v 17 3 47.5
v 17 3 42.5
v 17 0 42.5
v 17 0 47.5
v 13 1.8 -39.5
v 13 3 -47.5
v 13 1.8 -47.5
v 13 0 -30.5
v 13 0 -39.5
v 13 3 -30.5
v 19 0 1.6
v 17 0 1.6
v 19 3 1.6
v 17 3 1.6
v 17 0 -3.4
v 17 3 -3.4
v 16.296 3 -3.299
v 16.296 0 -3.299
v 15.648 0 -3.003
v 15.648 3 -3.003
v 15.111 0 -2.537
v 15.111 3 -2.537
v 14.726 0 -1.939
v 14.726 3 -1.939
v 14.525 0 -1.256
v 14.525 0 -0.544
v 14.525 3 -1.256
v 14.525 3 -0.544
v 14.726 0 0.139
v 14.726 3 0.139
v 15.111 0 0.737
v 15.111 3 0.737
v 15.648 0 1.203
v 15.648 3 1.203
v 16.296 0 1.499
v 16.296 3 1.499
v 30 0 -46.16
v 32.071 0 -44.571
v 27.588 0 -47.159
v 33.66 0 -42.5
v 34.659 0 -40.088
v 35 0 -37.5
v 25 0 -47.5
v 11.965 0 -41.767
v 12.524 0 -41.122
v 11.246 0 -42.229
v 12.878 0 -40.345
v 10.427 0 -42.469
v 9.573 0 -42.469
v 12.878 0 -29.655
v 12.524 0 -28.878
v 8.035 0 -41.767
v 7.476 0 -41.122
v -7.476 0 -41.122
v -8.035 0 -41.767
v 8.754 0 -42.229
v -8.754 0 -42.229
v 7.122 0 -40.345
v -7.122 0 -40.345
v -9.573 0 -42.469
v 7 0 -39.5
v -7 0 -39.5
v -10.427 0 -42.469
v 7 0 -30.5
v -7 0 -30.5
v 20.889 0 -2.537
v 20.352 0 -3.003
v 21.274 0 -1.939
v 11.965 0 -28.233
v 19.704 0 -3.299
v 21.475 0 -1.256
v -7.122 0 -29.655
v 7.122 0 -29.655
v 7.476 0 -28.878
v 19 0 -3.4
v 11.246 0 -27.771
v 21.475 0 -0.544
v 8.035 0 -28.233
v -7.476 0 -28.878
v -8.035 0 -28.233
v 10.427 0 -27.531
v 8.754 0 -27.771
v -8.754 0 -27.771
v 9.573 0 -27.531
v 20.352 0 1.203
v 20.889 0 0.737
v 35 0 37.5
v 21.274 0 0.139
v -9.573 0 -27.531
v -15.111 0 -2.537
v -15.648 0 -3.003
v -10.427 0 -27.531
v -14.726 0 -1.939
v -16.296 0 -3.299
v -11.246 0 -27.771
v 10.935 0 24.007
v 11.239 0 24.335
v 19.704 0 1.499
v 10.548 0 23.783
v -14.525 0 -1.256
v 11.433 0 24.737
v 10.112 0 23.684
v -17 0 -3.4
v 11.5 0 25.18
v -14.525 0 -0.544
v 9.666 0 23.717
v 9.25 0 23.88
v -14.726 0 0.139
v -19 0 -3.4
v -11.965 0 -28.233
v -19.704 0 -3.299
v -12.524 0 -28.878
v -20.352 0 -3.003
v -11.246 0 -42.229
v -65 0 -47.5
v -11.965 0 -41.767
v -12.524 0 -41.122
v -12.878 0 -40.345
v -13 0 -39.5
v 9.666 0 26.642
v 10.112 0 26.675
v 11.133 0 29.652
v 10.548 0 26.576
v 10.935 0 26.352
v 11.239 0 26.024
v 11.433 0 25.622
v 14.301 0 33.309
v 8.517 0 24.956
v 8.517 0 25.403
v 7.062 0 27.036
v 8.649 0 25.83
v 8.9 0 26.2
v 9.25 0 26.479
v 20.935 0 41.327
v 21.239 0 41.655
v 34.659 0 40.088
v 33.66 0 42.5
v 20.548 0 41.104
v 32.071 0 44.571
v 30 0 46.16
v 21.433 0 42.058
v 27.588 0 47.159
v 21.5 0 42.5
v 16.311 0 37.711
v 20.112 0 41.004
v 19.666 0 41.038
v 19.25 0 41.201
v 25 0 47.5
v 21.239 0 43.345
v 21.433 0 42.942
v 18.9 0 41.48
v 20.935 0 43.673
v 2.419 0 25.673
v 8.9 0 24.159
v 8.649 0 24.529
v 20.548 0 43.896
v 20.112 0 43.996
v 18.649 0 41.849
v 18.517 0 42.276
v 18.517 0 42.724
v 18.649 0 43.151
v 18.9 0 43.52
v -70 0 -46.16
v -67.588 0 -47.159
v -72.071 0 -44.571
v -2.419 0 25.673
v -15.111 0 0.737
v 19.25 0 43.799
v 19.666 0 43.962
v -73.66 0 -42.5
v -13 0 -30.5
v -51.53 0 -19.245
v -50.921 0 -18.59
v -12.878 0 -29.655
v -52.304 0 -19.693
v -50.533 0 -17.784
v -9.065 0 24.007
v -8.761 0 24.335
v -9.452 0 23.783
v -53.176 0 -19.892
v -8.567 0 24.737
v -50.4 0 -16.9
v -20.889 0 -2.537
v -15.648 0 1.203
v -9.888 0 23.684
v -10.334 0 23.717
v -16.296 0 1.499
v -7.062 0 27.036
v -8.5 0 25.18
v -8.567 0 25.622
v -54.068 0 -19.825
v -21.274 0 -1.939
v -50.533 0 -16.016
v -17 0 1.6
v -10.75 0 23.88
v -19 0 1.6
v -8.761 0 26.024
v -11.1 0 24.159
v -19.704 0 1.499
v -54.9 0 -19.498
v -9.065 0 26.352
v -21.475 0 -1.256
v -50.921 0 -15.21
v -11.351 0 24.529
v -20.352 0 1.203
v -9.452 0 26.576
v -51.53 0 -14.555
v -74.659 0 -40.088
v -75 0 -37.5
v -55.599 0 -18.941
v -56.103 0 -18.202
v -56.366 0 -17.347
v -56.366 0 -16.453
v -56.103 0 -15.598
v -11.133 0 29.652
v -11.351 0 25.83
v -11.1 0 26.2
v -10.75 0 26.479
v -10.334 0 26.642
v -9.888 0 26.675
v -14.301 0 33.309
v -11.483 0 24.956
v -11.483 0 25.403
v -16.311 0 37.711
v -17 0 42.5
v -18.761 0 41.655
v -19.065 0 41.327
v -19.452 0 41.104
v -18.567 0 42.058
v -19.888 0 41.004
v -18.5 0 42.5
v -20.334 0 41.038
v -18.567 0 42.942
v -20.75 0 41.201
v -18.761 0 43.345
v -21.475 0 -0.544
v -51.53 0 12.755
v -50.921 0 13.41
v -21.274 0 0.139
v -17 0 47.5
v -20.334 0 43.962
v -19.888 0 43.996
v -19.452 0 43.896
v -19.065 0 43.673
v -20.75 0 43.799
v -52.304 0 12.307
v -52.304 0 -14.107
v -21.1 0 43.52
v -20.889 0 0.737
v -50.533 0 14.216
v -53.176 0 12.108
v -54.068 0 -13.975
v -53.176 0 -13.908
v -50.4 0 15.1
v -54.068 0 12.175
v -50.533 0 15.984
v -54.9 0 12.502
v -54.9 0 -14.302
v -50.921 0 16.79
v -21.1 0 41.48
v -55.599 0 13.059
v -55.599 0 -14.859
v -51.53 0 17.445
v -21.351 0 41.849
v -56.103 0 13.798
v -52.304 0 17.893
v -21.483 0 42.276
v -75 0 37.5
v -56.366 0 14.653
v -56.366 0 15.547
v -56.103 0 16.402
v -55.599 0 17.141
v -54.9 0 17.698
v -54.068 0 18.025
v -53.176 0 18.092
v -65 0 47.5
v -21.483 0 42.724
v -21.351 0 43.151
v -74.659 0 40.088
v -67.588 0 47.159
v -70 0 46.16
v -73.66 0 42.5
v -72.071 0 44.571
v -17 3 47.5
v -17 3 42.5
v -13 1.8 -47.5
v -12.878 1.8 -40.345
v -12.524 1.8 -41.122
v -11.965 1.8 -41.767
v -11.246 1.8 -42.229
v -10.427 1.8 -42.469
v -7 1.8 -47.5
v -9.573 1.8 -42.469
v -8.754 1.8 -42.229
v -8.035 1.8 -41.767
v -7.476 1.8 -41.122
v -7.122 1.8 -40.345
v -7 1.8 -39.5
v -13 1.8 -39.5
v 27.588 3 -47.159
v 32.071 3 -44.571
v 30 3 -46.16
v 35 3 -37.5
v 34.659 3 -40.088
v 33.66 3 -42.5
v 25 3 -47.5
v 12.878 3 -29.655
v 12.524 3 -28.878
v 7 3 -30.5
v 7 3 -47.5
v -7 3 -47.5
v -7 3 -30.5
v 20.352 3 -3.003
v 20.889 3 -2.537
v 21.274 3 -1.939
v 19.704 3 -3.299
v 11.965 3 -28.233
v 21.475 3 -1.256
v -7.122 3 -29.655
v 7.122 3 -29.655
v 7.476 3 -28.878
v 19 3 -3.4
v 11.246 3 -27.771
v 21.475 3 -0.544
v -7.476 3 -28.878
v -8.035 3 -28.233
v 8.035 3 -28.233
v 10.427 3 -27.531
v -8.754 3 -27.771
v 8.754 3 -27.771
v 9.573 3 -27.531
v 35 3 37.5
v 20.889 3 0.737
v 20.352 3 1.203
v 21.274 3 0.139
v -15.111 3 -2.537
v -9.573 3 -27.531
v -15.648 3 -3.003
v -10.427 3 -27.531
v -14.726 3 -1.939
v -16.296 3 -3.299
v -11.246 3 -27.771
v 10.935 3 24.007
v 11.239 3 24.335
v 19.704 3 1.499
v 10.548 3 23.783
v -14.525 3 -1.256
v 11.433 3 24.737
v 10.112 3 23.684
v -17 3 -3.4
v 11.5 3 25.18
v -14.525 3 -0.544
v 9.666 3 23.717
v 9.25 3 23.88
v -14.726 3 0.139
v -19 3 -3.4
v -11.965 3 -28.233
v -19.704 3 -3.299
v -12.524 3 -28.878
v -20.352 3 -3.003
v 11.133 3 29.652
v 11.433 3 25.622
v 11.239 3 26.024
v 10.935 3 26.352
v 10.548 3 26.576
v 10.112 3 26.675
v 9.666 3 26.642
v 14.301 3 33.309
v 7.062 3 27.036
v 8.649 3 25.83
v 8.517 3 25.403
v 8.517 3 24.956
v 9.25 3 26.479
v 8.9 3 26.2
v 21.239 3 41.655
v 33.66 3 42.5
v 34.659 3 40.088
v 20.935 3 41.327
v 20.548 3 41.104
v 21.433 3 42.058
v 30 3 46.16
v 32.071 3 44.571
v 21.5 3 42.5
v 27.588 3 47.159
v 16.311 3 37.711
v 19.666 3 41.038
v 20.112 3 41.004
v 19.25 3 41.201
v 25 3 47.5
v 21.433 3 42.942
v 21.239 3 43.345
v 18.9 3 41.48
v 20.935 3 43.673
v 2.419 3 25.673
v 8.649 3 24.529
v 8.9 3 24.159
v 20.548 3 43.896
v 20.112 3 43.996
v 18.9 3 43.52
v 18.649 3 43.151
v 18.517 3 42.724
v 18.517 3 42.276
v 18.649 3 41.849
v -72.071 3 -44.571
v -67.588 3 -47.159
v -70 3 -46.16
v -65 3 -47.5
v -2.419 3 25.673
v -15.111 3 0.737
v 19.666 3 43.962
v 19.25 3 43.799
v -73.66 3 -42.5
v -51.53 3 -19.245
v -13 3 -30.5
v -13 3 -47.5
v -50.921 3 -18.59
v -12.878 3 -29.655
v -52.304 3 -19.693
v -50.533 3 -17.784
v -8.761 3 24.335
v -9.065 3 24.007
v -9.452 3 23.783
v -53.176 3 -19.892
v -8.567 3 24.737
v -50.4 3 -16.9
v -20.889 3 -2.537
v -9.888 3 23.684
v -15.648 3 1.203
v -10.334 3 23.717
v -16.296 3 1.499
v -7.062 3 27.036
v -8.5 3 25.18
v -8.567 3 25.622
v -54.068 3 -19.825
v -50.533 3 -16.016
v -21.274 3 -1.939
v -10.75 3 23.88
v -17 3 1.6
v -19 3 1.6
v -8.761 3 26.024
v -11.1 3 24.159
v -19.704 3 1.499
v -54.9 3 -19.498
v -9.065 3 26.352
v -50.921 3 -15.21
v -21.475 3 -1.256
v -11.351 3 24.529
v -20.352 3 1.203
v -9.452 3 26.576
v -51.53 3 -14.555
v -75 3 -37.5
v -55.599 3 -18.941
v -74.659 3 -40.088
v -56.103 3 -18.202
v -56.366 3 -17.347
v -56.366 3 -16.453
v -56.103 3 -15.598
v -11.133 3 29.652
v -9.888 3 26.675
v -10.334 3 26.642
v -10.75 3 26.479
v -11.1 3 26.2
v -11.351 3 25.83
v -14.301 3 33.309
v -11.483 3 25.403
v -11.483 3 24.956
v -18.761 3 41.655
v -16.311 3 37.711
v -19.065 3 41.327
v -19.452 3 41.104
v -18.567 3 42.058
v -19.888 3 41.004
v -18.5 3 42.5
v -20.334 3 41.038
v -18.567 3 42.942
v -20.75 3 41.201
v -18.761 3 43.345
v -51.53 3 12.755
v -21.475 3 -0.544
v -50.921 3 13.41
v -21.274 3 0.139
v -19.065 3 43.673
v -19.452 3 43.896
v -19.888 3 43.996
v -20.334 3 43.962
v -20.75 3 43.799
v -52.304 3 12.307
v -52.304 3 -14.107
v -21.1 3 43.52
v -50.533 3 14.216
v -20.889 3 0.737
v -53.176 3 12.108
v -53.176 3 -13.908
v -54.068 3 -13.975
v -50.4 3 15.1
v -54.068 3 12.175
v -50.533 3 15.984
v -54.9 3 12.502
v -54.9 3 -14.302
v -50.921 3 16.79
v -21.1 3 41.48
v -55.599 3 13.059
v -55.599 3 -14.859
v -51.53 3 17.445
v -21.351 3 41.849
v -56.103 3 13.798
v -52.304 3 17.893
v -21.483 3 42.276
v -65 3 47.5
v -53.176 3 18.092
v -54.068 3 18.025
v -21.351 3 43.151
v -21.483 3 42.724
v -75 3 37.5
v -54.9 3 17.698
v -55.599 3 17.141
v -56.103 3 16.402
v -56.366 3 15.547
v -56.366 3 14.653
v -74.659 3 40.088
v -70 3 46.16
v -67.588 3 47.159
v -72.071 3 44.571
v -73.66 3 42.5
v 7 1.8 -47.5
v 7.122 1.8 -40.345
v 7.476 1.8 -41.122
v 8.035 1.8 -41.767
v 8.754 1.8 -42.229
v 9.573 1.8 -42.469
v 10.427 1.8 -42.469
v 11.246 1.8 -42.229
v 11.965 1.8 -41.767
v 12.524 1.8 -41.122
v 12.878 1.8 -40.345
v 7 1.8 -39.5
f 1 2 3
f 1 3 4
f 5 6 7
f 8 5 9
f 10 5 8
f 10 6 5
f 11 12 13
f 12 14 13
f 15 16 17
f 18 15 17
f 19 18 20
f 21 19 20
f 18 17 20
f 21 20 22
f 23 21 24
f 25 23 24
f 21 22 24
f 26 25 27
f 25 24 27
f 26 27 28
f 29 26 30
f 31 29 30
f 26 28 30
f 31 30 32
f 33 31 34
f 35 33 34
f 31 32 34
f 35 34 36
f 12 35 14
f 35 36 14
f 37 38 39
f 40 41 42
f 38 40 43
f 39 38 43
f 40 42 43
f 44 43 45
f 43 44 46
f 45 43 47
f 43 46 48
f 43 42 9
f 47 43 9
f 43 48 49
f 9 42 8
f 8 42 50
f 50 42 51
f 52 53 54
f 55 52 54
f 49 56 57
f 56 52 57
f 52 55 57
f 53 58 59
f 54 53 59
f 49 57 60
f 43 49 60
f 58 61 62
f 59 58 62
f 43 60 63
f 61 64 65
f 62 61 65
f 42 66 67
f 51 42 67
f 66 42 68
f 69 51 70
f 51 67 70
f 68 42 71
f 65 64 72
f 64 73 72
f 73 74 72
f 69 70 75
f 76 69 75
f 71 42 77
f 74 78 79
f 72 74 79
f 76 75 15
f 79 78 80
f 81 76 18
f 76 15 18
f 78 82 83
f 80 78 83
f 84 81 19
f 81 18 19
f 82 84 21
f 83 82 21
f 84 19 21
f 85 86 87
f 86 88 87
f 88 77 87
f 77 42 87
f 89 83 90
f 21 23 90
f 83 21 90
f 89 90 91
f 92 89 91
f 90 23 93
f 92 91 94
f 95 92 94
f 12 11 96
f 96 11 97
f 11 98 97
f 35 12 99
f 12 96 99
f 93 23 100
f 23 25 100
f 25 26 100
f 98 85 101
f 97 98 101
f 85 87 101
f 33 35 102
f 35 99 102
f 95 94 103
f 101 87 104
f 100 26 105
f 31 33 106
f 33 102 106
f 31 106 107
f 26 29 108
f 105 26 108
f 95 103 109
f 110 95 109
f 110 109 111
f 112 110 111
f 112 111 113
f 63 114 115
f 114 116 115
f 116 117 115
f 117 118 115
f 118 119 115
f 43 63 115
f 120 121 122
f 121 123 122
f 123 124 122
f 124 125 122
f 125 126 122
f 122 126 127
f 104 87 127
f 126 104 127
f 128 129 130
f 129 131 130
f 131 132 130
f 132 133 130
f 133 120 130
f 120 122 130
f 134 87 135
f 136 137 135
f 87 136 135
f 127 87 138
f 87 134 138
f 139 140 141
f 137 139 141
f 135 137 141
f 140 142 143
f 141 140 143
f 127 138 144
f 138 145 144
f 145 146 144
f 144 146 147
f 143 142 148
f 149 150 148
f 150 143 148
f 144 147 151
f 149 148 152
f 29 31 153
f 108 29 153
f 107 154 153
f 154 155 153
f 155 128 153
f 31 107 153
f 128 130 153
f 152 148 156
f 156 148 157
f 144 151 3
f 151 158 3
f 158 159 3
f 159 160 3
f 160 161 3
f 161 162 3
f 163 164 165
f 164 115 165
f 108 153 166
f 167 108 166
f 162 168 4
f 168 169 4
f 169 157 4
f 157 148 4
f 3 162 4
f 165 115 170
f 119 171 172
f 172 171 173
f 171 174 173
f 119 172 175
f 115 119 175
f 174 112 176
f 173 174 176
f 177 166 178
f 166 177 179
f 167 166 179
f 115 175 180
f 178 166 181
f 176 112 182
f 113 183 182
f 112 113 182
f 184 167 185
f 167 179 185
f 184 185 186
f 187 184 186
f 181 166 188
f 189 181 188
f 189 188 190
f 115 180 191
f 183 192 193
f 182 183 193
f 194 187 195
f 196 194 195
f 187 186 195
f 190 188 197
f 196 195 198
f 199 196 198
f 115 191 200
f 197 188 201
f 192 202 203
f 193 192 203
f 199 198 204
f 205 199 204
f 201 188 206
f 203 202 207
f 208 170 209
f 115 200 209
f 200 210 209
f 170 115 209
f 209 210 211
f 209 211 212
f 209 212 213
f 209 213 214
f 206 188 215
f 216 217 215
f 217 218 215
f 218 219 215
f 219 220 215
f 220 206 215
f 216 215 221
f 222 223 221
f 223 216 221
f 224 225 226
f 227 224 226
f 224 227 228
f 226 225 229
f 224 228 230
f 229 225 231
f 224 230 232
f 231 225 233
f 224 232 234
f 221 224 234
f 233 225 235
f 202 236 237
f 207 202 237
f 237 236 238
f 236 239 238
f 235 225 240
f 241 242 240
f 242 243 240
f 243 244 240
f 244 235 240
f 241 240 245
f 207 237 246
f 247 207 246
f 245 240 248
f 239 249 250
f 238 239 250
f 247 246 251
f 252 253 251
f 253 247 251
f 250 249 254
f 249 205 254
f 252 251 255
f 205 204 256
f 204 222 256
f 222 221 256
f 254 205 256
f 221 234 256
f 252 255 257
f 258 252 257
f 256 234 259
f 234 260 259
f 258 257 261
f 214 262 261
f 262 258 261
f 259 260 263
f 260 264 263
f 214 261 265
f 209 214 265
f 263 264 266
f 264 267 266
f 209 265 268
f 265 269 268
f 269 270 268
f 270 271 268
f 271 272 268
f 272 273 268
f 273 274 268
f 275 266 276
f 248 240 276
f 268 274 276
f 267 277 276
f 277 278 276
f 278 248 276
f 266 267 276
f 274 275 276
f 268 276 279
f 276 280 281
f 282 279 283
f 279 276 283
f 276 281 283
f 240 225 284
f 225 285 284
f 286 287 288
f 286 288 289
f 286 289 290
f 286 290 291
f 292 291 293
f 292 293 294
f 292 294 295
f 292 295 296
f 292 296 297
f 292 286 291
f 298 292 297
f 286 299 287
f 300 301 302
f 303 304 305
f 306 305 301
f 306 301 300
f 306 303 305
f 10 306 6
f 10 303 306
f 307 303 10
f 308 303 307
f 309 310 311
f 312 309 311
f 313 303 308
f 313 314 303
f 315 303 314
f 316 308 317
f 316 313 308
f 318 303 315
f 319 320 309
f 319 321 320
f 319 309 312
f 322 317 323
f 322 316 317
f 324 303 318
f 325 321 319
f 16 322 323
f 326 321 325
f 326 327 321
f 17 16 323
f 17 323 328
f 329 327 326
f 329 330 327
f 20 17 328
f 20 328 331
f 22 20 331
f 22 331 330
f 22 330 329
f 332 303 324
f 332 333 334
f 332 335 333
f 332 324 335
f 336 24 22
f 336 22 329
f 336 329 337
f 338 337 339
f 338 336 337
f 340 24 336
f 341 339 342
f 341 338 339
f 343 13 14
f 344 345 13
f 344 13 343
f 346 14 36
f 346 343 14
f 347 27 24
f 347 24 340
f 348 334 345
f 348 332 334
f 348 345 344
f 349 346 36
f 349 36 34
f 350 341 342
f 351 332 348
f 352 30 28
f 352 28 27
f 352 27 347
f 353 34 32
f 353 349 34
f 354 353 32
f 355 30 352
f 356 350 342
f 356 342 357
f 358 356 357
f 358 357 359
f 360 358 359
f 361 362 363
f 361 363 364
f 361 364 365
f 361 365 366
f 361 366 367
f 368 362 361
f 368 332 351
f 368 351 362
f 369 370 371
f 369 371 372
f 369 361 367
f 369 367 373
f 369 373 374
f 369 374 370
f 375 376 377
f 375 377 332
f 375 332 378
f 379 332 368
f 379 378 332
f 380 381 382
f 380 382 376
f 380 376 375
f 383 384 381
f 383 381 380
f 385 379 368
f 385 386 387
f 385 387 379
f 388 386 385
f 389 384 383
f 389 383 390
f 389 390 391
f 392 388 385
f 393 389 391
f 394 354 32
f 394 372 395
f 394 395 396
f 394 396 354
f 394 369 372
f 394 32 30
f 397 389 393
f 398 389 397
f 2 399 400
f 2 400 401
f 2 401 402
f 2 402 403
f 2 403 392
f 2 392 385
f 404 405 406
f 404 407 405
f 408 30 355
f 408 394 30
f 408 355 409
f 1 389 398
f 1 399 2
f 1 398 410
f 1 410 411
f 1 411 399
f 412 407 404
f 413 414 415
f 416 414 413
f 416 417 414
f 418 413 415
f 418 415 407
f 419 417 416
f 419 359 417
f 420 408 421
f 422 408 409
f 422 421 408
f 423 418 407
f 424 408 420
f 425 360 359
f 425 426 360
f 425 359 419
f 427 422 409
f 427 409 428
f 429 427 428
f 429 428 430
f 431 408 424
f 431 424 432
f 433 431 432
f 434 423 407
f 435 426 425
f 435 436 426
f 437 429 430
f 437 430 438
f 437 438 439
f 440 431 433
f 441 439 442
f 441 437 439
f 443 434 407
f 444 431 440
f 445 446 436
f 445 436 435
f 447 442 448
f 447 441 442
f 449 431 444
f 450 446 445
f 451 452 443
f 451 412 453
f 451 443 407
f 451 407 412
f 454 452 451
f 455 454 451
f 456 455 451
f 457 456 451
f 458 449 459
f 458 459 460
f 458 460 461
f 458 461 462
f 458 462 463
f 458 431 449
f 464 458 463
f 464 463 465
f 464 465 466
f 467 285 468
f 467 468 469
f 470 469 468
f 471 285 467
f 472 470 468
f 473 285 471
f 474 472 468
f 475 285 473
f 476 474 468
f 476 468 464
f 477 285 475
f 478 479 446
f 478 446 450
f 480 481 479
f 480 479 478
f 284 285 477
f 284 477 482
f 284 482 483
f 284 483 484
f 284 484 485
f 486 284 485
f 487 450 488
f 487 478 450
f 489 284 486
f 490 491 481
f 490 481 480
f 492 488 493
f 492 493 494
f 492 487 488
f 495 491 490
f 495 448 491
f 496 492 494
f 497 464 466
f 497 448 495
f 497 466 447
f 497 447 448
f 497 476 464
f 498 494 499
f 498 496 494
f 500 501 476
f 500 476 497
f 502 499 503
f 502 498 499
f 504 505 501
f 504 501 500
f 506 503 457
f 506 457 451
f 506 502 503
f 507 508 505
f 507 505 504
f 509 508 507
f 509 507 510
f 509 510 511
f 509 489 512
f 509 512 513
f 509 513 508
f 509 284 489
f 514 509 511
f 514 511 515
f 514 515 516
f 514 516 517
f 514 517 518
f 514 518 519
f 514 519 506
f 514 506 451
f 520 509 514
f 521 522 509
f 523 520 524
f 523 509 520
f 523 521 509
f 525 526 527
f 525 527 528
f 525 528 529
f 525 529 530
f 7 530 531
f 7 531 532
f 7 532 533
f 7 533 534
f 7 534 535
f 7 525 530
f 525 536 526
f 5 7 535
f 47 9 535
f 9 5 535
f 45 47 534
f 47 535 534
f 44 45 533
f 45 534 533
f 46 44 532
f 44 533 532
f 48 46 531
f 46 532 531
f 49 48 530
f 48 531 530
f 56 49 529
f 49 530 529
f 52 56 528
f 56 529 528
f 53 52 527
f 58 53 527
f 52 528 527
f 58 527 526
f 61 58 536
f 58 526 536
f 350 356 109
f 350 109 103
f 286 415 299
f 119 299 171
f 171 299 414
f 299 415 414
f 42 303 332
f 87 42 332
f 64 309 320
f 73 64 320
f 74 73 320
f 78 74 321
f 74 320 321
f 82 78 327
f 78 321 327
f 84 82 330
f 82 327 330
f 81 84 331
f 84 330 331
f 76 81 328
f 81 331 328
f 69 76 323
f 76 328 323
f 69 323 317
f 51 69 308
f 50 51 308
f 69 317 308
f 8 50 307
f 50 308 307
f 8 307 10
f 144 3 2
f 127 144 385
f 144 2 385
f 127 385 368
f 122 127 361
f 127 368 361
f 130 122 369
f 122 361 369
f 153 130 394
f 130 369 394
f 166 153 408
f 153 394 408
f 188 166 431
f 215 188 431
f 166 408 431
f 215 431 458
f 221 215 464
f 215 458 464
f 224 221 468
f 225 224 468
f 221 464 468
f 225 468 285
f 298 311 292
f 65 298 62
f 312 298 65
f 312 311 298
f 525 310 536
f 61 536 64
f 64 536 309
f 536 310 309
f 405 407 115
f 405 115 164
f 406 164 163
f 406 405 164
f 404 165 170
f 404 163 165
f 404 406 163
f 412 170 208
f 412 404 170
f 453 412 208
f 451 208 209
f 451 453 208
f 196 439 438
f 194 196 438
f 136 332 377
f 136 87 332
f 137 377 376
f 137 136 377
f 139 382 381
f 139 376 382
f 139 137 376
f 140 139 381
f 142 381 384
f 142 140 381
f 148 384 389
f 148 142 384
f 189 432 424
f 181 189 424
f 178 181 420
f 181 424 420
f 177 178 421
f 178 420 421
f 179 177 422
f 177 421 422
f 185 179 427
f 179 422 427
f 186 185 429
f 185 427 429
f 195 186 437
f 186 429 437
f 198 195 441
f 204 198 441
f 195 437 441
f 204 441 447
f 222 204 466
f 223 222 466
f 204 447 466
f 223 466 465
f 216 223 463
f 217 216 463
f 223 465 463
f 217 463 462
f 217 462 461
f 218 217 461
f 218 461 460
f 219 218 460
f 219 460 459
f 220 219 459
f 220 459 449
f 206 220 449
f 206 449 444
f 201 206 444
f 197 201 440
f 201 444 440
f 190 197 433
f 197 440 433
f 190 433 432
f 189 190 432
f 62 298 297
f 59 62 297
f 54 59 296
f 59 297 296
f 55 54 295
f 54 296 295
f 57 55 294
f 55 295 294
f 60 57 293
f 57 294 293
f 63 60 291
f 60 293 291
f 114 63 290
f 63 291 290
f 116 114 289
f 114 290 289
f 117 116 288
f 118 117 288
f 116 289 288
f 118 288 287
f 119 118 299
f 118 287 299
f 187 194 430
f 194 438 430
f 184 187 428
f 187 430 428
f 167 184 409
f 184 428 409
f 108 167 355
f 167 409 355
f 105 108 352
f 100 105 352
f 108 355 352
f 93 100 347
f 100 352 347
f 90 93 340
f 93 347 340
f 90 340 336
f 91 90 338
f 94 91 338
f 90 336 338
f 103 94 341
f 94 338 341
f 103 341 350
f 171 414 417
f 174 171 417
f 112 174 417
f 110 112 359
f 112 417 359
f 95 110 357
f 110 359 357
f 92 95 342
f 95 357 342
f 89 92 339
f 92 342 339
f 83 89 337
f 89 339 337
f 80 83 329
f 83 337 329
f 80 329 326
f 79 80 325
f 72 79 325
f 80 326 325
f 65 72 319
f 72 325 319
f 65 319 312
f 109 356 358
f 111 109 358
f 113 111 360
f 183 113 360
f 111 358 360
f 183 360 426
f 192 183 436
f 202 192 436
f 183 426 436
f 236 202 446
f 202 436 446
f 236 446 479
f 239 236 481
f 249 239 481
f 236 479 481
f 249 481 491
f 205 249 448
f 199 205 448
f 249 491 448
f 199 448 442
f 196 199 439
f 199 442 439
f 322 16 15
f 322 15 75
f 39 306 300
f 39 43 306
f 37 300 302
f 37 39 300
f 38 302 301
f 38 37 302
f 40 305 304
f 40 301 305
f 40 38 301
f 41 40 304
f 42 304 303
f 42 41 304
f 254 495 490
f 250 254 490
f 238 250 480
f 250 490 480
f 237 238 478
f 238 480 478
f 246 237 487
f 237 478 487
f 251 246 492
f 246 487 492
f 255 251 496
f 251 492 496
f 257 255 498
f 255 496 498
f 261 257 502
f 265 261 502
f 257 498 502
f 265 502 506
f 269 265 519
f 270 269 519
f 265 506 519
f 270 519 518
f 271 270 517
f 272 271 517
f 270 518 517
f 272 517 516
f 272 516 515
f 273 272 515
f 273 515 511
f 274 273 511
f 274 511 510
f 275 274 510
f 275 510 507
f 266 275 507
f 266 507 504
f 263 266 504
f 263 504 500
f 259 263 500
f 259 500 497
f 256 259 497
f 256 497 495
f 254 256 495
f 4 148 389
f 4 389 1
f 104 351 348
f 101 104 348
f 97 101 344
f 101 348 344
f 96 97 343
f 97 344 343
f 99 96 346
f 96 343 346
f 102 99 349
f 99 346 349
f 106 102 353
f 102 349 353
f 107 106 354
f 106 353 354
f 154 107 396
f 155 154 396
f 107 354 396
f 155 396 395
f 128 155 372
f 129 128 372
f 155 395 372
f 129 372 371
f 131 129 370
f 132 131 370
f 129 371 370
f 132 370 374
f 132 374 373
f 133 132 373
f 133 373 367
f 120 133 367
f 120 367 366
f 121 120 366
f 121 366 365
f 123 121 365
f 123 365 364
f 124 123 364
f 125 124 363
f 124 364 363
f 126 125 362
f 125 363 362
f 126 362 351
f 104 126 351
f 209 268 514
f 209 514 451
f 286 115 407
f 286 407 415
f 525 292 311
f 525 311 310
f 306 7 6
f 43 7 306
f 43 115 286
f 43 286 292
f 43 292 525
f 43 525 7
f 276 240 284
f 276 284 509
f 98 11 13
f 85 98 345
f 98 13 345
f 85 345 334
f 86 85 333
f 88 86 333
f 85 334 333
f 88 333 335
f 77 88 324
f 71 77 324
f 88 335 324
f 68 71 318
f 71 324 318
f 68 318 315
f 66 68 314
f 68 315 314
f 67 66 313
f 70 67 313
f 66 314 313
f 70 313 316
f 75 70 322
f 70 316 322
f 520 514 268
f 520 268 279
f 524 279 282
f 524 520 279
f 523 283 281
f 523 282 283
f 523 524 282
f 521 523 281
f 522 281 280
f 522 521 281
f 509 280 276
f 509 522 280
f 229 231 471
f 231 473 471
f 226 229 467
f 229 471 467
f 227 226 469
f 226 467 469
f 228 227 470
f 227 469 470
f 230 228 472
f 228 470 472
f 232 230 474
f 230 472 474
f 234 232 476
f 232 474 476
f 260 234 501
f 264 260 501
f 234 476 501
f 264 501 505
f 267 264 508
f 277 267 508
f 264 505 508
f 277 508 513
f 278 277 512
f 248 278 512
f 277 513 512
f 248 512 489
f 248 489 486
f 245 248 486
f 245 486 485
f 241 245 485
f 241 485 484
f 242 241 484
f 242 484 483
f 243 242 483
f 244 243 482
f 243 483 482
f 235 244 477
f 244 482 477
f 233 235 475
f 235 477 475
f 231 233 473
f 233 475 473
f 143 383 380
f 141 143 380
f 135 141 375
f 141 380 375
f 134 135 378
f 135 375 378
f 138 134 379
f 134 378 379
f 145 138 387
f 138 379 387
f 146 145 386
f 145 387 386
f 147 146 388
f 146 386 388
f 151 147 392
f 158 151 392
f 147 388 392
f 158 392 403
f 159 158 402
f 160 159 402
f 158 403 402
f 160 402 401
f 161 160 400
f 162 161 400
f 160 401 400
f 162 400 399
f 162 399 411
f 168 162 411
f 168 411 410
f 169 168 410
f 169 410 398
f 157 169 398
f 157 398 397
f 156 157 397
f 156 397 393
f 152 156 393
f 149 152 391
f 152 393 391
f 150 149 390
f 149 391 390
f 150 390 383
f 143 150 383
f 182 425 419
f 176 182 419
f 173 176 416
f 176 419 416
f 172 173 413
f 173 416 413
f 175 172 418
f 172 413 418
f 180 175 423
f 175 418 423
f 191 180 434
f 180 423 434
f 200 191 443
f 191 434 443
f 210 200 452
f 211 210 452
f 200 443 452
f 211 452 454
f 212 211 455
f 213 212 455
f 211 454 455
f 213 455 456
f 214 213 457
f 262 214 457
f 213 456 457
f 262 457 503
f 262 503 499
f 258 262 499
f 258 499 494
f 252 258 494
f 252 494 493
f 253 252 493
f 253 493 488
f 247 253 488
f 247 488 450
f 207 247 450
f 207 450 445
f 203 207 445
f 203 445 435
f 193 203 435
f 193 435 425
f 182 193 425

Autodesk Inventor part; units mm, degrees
ref_plane "YZ Plane" through (0, 0, 0) normal (1, 0, 0) x (0, 1, 0)
ref_plane "XZ Plane" through (0, 0, 0) normal (0, 1, 0) x (-1, 0, 0)
ref_plane "XY Plane" through (0, 0, 0) normal (0, 0, 1) x (1, 0, 0)
sketch "Sketch1" plane through (0, 0, 0) normal (0, 1, 0) x (-1, 0, 0)
  line L0 (-75, 47.5) -> (75, 47.5)
  line L1 (75, 47.5) -> (75, -47.5)
  line L2 (75, -47.5) -> (-75, -47.5)
  line L3 (-75, -47.5) -> (-75, 47.5)
  line L4 (-75, 47.5) -> (75, -47.5) construction
  line L5 (75, 47.5) -> (-75, -47.5) construction
  point P0 (0, 0)
  dimension "d0" = 150
  dimension "d1" = 95
extrude "Extrusion1" add sketch "Sketch1" along normal blind 3
sketch "Sketch4" plane through (0, 3, 0) normal (0, 1, 0) x (1, 0, 0)
  line L0 (75, 47.5) -> (-75, 47.5) projected
  line L1 (-10, 47.5) -> (10, 47.5)
  line L2 (10, 47.5) -> (10, 27.5)
  line L3 (-10, 47.5) -> (-10, 27.5)
  line L4 (-10, 27.5) -> (10, 27.5)
  line L5 (-13, 47.5) -> (-7, 47.5)
  line L6 (7, 47.5) -> (13, 47.5)
  line L7 (-10, 47.5) -> (-10, 42.5)
  line L8 (10, 47.5) -> (10, 42.5)
  line L9 (-10, 42.5) -> (-10, 39.5)
  line L10 (10, 42.5) -> (10, 39.5)
  line L11 (-10, 27.5) -> (-10, 30.5)
  line L12 (10, 27.5) -> (10, 30.5)
  circle A0 centre (-10, 30.5) radius 3
  circle A1 centre (10, 30.5) radius 3
  circle A2 centre (-10, 39.5) radius 3
  circle A3 centre (10, 39.5) radius 3
  line L13 (-13, 39.5) -> (-13, 30.5)
  line L14 (-7, 39.5) -> (-7, 30.5)
  line L15 (7, 39.5) -> (7, 30.5)
  line L16 (13, 39.5) -> (13, 30.5)
  line L17 (-10, 27.5) -> (-7, 27.5)
  line L18 (-7, 27.5) -> (-7, 47.5)
  line L19 (-7, 47.5) -> (-10, 47.5)
  line L20 (-10, 47.5) -> (-10, 27.5)
  line L21 (-10, 47.5) -> (-13, 47.5)
  line L22 (-13, 47.5) -> (-13, 27.5)
  line L23 (-13, 27.5) -> (-10, 27.5)
  line L24 (-10, 27.5) -> (-10, 47.5)
  line L25 (10, 27.5) -> (7, 27.5)
  line L26 (7, 27.5) -> (7, 47.5)
  line L27 (7, 47.5) -> (10, 47.5)
  line L28 (10, 47.5) -> (10, 27.5)
  line L29 (10, 27.5) -> (13, 27.5)
  line L30 (13, 27.5) -> (13, 47.5)
  line L31 (13, 47.5) -> (10, 47.5)
  line L32 (10, 47.5) -> (10, 27.5)
  point P0 (0, 0)
  point P1 (0, 47.5)
  point P2 (7, 47.5)
  point P3 (7, 39.5)
  point P4 (-7, 39.5)
  point P5 (-7, 47.5)
  point P6 (-13, 47.5)
  point P7 (-13, 39.5)
  dimension "d14" = 20
  dimension "d15" = 20
  dimension "d16" = 6
  dimension "d17" = 6
  dimension "d18" = 5
  dimension "d19" = 5
  dimension "d20" = 3
  dimension "d21" = 3
  dimension "d22" = 3
  dimension "d23" = 3
extrude "Extrusion3" cut sketch "Sketch4" against normal through all contours A3 L2 | L16 A1 L2 A3 | L2 A3 | L2 A1 L15 A3 | A1 L2 | L2 A1 | A2 L3 | L14 A0 L3 A2 | L3 A2 | L3 A0 L13 A2 | A0 L3 | L3 A0
extrude "Extrusion5" cut sketch "Sketch4" against normal blind 1.2 contours L30 A3 L2 L0 | L2 A3 L26 L0 | L18 A2 L3 L0 | L3 A2 L22 L0
sketch "Sketch6" plane through (0, 3, 0) normal (0, 1, 0) x (1, 0, 0)
  line L0 (75, 47.5) -> (-75, 47.5) projected
  line L1 (0, 47.5) -> (0, 22.5)
  line L2 (0, 22.5) -> (0, -20.7)
  line L3 (0, -20.7) -> (0, 0.9)
  line L4 (0, 0.9) -> (-53.4, 0.9)
  line L5 (-53.4, -15.1) -> (-53.4, 16.9)
  circle A0 centre (-53.4, 16.9) radius 3
  circle A1 centre (-53.4, -15.1) radius 3
  line L6 (-19, 0.9) -> (19, 0.9)
  circle A2 centre (19, 0.9) radius 2.5
  circle A3 centre (-19, 0.9) radius 2.5
  line L7 (-19, 0.9) -> (-17, 0.9)
  line L8 (19, 0.9) -> (17, 0.9)
  circle A4 centre (17, 0.9) radius 2.5
  circle A5 centre (-17, 0.9) radius 2.5
  line L9 (-19, 3.4) -> (-17, 3.4)
  line L10 (-19, -1.6) -> (-17, -1.6)
  line L11 (17, 3.4) -> (19, 3.4)
  line L12 (17, -1.6) -> (19, -1.6)
  point P0 (0, 0)
  dimension "d40" = 25
  dimension "d41" = 43.2
  dimension "d42" = 53.4
  dimension "d43" = 32
  dimension "d44" = 6
  dimension "d45" = 6
  dimension "d46" = 38
  dimension "d47" = 5
  dimension "d48" = 5
  dimension "d49" = 2
  dimension "d50" = 2
  dimension "d51" = 5
  dimension "d52" = 5
extrude "Extrusion6" cut sketch "Sketch6" against normal through all
sketch "Sketch7" plane through (0, 3, 0) normal (0, 1, 0) x (1, 0, 0)
  line L0 (75, 47.5) -> (-75, 47.5) projected
  line L1 (-75, -47.5) -> (75, -47.5) projected
  line L2 (75, 47.5) -> (35, 47.5)
  line L3 (35, 47.5) -> (35, -47.5)
  line L4 (35, -47.5) -> (75, -47.5)
  line L5 (75, -47.5) -> (75, 47.5)
  point P0 (0, 0)
  point P1 (75, -47.5)
  dimension "d55" = 40
extrude "Extrusion7" cut sketch "Sketch7" against normal through all
sketch "Sketch8" plane through (0, 3, 0) normal (0, 1, 0) x (1, 0, 0)
  line L0 (-75, -47.5) -> (35, -47.5) projected
  line L1 (7, 47.5) -> (-7, 47.5) projected
  line L2 (0, 47.5) -> (0, -42.5)
  circle A0 centre (0, -42.5) radius 25
  circle A1 centre (0, -42.5) radius 20
  line L3 (0, -42.5) -> (-20, -42.5)
  circle A2 centre (-20, -42.5) radius 1.5
  circle A3 centre (-10, -59.8205) radius 1.5
  circle A4 centre (10, -59.8205) radius 1.5
  circle A5 centre (20, -42.5) radius 1.5
  circle A6 centre (10, -25.1795) radius 1.5
  circle A7 centre (-10, -25.1795) radius 1.5
  circle A8 centre (0, -42.5) radius 17
  line L4 (-17, -42.5) -> (-17, -47.5)
  line L5 (17, -42.5) -> (17, -47.5)
  point P0 (0, 0)
  dimension "d60" = 90
  dimension "d61" = 50
  dimension "d62" = 40
  dimension "d63" = 20
  dimension "d64" = 3
  dimension "d67" = 360
  dimension "d69" = 34
extrude "Extrusion8" cut sketch "Sketch8" against normal through all contours L4 A8 L0 | A2 A1 | A1 L3 A2 | A8 L3 L2 L0 | A8 L2 L3 | A1 A2 L3 | A6 A1 | A1 A6 | A7 A1 | A1 A7 | L0 A8 L5 | A5 A1 | A1 A5
fillet "Fillet1" radius 10 4 edges at (35, 1.5, 47.5) (35, 1.5, -47.5) (-75, 1.5, 47.5) (-75, 1.5, -47.5)
properties part number "TopMount"
